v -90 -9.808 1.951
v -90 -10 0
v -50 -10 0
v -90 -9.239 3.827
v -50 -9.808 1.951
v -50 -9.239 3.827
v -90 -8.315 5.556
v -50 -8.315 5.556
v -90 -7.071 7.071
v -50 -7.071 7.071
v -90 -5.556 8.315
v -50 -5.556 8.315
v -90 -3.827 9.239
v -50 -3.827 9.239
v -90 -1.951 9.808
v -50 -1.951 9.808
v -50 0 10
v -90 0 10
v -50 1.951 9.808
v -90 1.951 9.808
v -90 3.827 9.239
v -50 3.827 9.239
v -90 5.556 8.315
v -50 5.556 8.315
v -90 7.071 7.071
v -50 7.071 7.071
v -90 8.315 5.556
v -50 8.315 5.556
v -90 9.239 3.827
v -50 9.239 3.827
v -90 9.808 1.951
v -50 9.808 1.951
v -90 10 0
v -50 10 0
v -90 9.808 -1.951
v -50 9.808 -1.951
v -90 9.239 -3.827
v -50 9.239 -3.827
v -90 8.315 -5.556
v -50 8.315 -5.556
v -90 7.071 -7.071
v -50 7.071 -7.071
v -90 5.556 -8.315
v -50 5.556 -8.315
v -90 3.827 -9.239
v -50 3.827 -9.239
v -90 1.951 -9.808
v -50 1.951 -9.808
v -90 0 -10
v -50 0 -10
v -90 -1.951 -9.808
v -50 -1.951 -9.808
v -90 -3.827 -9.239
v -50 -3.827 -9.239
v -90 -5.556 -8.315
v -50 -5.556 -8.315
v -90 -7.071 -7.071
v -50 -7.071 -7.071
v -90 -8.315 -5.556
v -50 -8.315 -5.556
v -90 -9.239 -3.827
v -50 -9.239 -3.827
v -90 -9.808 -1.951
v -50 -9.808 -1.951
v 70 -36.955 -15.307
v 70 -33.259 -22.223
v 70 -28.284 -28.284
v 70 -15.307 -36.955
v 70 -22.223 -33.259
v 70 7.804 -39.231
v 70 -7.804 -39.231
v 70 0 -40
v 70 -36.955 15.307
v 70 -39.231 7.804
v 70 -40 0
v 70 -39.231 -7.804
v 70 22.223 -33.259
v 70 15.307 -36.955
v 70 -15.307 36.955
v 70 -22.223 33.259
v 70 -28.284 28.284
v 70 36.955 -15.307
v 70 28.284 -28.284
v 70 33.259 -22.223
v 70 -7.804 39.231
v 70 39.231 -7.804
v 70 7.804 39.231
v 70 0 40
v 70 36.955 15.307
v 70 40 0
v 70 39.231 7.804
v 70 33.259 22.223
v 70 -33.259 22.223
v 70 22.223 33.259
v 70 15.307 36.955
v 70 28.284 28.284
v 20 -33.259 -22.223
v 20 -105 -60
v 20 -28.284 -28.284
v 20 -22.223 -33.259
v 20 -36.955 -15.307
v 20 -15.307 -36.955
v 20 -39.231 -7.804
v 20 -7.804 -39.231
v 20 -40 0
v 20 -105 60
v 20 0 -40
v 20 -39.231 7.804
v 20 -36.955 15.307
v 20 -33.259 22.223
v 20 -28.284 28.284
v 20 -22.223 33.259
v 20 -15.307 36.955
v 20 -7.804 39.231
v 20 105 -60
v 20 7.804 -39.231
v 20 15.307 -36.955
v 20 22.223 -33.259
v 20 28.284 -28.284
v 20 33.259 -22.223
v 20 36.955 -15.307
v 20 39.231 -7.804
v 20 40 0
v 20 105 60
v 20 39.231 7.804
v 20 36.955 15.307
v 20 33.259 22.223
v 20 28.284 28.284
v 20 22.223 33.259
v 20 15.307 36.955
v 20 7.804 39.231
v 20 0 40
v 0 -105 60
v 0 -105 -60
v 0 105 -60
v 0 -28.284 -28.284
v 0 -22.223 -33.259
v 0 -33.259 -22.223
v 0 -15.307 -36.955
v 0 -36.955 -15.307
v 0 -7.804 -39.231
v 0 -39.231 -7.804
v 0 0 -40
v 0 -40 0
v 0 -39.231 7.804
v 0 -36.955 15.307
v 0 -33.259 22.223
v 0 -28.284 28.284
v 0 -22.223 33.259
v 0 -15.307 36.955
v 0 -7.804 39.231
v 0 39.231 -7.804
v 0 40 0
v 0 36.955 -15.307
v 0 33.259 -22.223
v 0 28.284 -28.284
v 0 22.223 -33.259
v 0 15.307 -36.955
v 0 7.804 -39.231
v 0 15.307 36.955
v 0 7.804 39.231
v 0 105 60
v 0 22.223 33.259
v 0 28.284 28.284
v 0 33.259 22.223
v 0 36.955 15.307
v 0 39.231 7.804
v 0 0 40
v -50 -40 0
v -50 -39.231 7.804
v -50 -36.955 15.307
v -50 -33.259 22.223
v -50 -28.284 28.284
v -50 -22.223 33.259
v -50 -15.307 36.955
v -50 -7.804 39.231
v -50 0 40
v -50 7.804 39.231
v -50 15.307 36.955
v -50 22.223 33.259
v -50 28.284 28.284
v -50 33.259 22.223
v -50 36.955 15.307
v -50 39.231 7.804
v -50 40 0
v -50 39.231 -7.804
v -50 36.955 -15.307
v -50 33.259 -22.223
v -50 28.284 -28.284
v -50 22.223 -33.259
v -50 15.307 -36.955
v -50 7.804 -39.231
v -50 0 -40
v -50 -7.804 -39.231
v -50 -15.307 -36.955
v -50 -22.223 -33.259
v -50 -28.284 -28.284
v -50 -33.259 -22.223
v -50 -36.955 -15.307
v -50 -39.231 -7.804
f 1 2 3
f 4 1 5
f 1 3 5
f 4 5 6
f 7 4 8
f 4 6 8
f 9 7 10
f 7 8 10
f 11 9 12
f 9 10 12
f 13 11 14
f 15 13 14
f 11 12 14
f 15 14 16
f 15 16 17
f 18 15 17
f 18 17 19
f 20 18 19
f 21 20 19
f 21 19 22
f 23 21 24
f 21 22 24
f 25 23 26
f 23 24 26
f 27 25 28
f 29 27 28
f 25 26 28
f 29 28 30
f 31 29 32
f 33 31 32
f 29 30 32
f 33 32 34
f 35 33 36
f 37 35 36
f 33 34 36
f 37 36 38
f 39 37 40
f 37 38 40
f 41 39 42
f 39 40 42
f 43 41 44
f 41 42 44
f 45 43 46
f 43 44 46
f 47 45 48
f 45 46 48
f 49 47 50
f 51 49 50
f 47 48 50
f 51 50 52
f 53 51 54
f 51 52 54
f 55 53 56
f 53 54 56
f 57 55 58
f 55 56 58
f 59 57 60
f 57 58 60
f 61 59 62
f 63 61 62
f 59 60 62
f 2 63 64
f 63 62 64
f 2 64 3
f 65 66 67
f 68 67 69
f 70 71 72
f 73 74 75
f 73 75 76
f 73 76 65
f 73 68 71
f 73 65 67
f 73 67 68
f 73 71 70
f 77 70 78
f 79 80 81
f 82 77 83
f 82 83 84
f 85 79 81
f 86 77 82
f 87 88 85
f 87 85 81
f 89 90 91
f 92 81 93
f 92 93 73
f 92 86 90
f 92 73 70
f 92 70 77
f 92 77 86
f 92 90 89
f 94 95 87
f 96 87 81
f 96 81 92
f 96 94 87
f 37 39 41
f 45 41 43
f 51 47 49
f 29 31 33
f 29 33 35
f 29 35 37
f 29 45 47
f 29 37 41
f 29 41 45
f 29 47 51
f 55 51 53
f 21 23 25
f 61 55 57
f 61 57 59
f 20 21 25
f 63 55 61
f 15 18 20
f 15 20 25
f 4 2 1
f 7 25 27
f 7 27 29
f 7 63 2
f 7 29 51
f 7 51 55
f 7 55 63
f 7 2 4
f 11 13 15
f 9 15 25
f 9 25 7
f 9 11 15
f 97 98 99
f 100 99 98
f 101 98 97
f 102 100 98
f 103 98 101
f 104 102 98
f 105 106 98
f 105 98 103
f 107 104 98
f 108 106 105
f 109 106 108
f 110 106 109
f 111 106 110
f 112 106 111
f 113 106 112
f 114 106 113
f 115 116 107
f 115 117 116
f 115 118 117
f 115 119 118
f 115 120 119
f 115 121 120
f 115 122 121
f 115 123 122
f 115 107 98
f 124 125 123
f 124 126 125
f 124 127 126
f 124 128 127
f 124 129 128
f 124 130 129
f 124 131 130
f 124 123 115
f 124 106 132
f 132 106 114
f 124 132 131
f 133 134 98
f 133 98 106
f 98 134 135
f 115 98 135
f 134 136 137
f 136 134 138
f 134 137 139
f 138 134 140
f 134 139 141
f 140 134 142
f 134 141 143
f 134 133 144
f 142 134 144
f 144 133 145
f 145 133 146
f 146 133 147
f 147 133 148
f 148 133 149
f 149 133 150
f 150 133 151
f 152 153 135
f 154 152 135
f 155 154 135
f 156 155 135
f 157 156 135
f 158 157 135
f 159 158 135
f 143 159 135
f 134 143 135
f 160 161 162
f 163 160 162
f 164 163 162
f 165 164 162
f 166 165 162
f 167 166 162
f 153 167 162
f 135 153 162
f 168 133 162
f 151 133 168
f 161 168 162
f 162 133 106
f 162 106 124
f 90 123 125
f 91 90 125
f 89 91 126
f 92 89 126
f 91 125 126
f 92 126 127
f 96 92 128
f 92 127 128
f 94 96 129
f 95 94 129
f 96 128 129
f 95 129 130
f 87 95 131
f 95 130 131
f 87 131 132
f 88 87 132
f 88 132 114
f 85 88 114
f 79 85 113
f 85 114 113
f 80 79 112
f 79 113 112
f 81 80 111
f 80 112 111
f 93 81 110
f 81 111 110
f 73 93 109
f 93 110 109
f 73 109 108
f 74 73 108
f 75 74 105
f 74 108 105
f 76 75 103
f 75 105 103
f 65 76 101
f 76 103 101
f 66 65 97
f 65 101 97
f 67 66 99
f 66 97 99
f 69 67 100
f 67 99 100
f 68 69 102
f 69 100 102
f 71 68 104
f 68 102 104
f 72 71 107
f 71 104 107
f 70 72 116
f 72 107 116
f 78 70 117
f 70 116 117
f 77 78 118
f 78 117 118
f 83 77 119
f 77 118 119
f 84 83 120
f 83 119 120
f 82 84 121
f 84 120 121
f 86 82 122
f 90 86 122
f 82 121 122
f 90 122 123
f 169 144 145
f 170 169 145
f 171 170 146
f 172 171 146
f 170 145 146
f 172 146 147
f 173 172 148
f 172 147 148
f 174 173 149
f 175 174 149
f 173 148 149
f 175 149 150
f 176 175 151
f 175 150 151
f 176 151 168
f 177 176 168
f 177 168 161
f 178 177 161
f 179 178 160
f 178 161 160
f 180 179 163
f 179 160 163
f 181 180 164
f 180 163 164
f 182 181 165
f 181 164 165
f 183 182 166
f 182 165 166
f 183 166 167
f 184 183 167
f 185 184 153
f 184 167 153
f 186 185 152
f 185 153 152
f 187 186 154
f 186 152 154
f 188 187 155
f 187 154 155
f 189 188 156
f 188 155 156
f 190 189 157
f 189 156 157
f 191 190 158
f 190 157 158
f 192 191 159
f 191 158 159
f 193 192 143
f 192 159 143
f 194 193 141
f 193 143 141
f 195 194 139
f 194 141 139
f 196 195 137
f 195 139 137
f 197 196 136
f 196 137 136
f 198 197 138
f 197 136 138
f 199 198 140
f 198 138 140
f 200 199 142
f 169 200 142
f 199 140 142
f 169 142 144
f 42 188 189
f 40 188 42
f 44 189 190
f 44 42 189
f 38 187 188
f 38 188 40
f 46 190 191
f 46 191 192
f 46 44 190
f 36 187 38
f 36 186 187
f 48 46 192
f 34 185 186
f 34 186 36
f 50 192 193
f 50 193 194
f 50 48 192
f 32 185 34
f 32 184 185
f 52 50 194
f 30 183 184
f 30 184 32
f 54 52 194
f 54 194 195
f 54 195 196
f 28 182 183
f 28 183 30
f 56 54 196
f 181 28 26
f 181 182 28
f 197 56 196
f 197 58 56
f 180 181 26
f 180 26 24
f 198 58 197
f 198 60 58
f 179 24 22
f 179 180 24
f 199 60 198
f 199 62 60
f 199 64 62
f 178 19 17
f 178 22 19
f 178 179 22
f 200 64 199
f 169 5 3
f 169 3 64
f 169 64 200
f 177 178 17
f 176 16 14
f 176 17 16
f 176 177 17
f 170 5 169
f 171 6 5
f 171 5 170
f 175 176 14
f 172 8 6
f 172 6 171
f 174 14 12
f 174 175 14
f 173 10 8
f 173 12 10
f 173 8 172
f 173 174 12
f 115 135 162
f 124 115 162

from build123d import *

# Parameters (mm, degrees)
F0_W     = 210
F0_H     = 120
F1_DEPTH = 20
F2_R     = 40
F3_DEPTH = 50
F4_R     = 40
F5_DEPTH = 50
F6_R     = 10
F7_DEPTH = 40


with BuildPart() as f1:
    # F0 (on Right) → F1 (new body)
    with BuildSketch(Plane.YZ):
        Rectangle(F0_W, F0_H)
    extrude(amount=F1_DEPTH)

    # F2 (on face) → F3 (join)
    with BuildSketch(Plane(origin=(0, 0, 0), x_dir=(0, -1, 0), z_dir=(-1, 0, 0))):
        Circle(F2_R)
    extrude(amount=F3_DEPTH)

    # F4 (on face) → F5 (join)
    with BuildSketch(Plane.YZ.offset(20)):
        Circle(F4_R)
    extrude(amount=F5_DEPTH)

    # F6 (on face) → F7 (join)
    with BuildSketch(Plane(origin=(-50, 0, 0), x_dir=(0, -1, 0), z_dir=(-1, 0, 0))):
        Circle(F6_R)
    extrude(amount=F7_DEPTH)


solid = f1.part
